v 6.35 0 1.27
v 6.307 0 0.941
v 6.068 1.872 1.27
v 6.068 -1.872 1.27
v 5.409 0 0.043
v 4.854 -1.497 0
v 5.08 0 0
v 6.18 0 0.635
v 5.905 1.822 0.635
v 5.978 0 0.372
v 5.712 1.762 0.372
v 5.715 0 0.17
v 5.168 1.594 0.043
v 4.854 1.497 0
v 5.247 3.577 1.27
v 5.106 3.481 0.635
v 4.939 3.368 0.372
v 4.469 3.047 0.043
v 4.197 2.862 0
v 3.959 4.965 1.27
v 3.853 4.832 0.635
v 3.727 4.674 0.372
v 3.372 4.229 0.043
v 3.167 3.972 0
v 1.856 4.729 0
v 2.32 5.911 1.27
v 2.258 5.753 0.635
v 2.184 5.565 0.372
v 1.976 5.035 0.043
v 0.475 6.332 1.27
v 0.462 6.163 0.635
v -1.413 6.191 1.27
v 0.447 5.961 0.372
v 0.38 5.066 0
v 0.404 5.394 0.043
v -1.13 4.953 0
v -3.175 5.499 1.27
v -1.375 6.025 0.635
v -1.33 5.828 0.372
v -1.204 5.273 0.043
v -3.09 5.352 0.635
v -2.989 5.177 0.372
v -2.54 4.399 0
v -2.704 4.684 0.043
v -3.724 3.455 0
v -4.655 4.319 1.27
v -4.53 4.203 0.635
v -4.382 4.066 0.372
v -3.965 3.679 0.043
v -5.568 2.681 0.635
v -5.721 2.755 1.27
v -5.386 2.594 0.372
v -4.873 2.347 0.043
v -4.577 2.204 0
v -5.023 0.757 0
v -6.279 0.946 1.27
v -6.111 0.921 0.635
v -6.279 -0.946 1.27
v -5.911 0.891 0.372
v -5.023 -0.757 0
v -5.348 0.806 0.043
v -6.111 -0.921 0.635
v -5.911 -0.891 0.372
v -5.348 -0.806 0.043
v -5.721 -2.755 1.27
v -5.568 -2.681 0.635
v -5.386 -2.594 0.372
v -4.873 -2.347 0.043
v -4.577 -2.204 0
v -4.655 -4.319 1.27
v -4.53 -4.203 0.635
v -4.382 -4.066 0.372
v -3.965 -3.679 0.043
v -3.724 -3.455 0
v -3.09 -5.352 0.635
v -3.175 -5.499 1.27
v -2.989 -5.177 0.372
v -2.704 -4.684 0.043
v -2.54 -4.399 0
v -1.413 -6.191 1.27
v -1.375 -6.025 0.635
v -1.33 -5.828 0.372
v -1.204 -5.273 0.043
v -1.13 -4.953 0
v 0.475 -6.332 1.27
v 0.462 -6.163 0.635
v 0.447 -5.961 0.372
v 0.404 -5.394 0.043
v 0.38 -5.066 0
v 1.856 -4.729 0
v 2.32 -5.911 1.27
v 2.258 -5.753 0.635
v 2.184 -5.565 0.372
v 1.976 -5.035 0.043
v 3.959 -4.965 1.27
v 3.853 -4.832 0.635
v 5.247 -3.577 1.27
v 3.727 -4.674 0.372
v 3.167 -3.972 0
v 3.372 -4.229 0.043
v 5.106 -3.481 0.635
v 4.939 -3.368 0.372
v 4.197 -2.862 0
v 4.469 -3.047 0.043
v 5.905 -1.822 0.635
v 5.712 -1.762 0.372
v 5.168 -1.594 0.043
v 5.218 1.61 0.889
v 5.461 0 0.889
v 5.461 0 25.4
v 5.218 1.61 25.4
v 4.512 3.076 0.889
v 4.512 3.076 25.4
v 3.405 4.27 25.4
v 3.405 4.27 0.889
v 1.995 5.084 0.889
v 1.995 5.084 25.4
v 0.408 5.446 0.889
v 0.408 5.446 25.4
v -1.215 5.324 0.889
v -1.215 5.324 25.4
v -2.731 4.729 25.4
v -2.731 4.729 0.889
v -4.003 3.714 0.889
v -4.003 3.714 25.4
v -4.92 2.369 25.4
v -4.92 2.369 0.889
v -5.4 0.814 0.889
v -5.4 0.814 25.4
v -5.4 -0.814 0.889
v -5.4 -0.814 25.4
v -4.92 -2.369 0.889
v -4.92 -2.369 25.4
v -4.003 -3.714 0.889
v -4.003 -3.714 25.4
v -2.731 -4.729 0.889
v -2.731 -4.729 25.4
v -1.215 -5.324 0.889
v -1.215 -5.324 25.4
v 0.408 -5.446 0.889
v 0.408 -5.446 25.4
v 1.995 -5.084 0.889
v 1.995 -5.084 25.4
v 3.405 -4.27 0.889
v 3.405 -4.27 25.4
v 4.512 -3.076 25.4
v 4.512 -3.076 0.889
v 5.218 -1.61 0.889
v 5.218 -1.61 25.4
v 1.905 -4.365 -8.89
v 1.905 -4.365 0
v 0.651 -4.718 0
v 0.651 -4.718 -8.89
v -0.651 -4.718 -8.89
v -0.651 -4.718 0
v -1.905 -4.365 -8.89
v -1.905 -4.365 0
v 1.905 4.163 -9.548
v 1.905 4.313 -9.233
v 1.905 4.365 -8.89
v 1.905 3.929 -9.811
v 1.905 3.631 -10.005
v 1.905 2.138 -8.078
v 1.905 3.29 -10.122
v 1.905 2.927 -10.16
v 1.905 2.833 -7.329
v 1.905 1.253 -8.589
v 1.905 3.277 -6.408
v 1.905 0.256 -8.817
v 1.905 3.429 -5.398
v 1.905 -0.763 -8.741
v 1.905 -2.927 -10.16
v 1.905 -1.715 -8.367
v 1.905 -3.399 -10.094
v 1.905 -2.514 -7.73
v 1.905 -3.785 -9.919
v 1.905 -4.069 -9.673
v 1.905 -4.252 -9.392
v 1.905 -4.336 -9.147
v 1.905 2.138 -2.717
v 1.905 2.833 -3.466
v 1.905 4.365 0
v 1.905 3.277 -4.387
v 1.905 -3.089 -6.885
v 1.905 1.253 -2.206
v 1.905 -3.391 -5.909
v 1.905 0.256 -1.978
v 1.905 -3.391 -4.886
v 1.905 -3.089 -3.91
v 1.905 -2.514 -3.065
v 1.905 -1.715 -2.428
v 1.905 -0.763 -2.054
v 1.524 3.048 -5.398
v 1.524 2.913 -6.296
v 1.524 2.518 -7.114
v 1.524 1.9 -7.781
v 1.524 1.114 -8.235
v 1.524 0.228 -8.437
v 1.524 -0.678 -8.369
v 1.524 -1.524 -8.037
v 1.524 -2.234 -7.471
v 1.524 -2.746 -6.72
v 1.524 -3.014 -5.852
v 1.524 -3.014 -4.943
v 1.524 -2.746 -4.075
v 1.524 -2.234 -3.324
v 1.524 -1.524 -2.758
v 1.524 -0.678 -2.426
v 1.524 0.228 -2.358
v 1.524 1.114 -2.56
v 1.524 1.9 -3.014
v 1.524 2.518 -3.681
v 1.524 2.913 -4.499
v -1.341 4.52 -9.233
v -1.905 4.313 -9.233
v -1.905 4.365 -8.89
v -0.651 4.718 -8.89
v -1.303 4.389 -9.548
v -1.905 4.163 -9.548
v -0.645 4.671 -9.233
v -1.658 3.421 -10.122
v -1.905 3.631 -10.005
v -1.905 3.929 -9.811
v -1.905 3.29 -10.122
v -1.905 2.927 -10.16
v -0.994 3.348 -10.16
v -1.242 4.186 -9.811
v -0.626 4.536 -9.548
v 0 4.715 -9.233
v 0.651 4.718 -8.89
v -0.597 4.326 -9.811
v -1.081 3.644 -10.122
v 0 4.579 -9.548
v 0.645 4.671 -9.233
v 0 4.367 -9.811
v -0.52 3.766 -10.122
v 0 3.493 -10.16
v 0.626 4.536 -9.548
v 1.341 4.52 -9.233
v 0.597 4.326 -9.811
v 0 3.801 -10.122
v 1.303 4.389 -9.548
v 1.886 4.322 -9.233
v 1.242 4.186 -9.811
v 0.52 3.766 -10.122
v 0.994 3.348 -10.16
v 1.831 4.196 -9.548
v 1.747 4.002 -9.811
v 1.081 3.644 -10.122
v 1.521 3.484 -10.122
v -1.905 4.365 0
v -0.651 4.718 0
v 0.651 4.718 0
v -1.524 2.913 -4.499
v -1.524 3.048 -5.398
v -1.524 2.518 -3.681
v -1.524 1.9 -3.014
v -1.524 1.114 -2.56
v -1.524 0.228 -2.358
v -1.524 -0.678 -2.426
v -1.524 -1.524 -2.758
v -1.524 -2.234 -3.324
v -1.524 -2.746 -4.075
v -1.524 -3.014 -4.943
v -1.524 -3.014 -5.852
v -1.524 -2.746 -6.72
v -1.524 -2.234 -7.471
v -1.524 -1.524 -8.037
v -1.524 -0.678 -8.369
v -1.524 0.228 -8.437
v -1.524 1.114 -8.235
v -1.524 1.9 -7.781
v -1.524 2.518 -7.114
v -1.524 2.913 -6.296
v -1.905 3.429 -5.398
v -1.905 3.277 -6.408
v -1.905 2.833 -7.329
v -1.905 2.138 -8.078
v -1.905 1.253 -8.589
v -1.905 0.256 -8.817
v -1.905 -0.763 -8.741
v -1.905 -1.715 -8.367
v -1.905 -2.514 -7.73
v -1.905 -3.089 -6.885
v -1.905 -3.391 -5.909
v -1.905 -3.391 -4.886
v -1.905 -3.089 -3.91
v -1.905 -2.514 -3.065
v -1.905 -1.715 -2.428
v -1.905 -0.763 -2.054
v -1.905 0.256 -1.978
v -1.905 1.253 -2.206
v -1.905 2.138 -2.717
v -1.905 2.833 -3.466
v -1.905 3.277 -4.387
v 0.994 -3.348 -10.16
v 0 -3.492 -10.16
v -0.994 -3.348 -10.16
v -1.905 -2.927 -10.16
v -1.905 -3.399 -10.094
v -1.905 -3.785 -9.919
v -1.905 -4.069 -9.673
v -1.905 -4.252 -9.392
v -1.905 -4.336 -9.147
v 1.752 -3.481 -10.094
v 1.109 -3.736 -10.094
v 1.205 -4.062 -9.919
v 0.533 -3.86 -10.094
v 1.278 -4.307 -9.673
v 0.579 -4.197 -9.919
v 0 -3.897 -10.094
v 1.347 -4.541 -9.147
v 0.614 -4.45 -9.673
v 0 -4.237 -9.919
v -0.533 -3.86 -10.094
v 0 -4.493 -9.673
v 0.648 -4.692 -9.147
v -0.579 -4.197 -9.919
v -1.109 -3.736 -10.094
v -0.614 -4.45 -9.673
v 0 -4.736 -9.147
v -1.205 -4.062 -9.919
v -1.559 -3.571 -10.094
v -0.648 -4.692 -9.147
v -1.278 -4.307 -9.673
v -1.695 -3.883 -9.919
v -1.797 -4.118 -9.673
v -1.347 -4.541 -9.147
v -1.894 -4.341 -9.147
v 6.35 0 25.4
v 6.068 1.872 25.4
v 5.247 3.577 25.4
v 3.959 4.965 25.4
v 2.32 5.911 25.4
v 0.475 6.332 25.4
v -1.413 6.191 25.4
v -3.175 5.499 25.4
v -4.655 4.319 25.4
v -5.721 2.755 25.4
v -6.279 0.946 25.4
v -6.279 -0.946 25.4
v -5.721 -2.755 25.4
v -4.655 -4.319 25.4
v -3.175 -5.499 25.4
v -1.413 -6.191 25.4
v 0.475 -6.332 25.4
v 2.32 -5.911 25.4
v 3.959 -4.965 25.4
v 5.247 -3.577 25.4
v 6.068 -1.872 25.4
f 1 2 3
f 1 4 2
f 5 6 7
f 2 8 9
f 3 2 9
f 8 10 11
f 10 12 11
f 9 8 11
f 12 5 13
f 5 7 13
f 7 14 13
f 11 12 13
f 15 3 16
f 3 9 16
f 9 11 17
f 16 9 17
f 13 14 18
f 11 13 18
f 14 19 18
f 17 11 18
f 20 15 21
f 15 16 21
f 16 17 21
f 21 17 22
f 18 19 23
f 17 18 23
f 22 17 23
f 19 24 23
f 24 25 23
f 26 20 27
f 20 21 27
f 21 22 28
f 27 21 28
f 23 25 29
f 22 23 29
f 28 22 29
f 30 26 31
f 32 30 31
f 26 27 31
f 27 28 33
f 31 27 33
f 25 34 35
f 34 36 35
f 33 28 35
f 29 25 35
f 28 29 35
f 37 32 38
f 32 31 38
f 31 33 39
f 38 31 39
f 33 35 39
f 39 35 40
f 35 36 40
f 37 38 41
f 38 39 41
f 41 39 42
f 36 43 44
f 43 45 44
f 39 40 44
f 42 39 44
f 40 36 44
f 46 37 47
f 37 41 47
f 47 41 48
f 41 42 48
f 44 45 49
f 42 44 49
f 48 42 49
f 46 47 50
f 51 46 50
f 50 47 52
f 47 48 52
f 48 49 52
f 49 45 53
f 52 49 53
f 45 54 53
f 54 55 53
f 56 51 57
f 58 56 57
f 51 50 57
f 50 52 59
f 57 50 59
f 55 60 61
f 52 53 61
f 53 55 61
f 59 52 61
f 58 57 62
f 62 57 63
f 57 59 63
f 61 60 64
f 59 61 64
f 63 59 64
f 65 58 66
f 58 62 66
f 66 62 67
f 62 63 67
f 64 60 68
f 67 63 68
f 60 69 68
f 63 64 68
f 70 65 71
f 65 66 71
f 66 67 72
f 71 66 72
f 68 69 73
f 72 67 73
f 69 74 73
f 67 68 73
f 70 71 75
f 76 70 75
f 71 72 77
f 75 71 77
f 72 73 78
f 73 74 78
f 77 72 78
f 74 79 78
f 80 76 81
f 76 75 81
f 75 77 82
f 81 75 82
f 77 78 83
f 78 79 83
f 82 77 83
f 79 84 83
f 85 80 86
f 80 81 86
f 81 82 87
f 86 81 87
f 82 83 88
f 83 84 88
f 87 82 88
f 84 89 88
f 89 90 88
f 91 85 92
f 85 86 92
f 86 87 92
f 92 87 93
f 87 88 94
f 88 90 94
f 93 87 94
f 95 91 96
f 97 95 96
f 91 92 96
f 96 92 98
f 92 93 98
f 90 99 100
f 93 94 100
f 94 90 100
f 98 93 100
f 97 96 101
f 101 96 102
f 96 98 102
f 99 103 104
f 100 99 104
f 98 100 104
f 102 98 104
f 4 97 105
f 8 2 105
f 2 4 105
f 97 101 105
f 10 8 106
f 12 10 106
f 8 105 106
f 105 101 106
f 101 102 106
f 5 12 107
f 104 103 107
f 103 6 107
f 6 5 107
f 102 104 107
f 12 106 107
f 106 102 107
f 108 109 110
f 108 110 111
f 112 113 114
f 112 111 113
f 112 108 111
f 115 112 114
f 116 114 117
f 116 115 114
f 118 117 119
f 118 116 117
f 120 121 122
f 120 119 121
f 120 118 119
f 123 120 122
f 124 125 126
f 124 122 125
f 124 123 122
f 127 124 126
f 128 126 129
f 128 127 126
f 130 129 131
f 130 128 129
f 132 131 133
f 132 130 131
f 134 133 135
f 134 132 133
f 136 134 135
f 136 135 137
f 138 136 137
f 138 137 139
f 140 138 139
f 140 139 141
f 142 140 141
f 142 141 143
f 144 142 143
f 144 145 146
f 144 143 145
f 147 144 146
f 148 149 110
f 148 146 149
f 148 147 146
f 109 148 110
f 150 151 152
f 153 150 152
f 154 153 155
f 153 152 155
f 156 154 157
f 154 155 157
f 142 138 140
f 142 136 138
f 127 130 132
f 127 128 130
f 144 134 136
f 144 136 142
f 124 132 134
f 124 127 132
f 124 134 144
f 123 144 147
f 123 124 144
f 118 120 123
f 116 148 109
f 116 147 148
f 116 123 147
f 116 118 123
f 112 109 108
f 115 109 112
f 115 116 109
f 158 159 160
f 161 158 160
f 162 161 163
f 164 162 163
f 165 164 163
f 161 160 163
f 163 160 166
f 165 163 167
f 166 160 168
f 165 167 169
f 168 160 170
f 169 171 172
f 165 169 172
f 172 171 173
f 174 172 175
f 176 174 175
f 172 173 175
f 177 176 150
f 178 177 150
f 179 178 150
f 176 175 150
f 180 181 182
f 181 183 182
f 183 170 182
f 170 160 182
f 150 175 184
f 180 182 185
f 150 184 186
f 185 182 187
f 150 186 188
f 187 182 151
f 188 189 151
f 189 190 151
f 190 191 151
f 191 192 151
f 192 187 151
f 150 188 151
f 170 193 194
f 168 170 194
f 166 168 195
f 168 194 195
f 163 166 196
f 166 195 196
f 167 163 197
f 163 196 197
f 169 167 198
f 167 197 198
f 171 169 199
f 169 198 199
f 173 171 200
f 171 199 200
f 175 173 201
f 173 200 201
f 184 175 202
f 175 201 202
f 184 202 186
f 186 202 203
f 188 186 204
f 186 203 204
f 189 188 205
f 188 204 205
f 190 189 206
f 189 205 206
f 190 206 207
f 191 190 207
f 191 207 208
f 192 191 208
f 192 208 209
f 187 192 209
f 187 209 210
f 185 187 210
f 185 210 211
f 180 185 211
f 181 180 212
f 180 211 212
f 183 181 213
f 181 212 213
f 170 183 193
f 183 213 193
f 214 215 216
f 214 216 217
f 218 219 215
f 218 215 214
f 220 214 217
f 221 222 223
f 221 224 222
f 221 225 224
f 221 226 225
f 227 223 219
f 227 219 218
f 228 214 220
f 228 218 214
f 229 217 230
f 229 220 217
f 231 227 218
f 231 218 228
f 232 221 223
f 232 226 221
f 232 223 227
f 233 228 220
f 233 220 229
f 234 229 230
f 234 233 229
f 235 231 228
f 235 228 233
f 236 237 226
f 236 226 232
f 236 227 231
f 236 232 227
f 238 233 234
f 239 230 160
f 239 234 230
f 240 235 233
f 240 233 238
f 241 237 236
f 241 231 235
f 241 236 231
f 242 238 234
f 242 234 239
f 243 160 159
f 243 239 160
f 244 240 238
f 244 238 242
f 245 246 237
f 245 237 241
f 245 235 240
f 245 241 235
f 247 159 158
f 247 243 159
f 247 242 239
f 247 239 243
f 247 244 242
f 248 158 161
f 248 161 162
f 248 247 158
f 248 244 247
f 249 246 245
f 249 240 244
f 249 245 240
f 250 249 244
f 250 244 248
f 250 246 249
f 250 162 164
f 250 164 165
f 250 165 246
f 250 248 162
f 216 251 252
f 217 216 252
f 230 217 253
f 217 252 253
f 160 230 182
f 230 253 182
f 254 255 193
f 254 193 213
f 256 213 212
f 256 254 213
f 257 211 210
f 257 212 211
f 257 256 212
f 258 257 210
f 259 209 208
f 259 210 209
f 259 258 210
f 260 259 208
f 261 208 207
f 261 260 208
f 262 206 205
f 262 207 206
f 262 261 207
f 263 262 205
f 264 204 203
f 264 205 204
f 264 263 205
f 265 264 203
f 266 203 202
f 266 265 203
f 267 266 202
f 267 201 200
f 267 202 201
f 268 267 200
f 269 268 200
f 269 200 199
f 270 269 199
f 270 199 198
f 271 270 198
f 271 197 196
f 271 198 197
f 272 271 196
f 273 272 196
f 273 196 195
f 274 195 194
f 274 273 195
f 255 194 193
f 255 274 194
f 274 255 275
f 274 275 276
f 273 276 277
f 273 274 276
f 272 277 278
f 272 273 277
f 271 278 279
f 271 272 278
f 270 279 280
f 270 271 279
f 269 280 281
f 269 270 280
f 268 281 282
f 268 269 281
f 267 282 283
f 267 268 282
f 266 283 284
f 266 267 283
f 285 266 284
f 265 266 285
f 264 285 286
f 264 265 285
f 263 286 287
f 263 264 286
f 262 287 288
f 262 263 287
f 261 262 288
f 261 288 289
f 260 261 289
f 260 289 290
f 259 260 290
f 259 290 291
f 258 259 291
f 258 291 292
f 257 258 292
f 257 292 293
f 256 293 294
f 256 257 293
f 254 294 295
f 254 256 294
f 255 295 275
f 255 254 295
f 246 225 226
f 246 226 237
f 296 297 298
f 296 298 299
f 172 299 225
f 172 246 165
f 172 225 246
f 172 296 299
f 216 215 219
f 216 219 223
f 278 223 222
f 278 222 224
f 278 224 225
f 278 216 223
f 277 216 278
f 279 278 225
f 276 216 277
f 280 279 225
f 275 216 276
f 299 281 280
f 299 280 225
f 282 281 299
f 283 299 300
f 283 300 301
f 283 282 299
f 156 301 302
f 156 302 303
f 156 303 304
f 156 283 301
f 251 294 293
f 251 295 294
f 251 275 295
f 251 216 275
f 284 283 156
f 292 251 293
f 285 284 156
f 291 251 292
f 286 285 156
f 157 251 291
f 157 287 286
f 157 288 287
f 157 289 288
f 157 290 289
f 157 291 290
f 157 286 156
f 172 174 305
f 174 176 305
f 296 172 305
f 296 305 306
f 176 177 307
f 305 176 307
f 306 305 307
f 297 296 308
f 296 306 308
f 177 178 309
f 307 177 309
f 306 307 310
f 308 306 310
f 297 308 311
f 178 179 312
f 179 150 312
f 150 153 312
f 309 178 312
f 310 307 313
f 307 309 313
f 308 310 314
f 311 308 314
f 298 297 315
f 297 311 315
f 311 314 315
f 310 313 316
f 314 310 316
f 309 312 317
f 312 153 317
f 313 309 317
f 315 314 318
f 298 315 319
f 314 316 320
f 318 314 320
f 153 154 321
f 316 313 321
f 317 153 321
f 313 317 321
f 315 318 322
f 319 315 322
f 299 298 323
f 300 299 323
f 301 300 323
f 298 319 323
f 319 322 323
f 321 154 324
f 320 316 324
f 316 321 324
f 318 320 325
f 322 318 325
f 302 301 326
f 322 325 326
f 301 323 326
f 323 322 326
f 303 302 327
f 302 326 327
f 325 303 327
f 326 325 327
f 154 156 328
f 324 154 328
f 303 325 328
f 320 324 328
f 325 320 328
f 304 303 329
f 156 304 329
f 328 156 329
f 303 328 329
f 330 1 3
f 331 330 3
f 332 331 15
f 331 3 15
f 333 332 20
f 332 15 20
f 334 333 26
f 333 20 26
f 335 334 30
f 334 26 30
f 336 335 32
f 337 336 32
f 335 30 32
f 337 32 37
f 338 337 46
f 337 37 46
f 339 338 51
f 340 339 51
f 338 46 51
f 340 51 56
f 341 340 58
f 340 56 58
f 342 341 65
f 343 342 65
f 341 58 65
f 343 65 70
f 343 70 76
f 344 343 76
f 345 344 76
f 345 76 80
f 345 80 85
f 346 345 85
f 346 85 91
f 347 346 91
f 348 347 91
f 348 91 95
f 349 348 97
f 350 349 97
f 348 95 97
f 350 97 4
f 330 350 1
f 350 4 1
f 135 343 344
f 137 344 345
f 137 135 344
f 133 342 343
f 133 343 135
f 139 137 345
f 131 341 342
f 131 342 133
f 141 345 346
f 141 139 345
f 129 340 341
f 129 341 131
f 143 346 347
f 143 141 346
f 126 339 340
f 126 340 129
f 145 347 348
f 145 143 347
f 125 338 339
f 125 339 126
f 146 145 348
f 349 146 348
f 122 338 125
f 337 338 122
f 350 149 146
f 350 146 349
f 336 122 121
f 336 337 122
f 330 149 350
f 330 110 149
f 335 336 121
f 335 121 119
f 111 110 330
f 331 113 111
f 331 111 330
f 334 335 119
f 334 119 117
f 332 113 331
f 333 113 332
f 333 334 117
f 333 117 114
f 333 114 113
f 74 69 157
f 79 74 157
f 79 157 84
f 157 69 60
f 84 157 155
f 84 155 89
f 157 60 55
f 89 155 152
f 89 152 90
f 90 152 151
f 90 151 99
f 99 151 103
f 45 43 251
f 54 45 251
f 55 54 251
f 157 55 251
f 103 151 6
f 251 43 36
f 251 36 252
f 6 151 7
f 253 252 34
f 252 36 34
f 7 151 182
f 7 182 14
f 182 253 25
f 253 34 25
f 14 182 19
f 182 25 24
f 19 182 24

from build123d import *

# Parameters (mm, degrees)
SKETCH1_R               = 6.35
BOSS_EXTRUDE1_DEPTH     = 25.4
SHELL1_T                = -0.889
FILLET1_R               = 1.27
SKETCH2_R               = 4.7625
BOSS_EXTRUDE2_DEPTH     = 10.16
CUT_EXTRUDE1_START      = -10.16
CUT_EXTRUDE1_DEPTH      = 10.16
CUT_EXTRUDE2_DEPTH      = 28.452277251
CUT_EXTRUDE2_DEPTH_BACK = 28.452277251
SKETCH4_R               = 3.048
CHAMFER2_SIZE           = 0.381
FILLET2_R               = 1.27


with BuildPart() as part:
    # Sketch1 → Boss-Extrude1 (new body)
    with BuildSketch(Plane.XY):
        Circle(SKETCH1_R)
    extrude(amount=BOSS_EXTRUDE1_DEPTH)

    # Shell1
    shell1_openings = [part.faces().sort_by_distance(p)[0] for p in [
        (0, 0, 25.4),
    ]]
    offset(amount=SHELL1_T, openings=shell1_openings, kind=Kind.INTERSECTION)

    # Fillet1
    fillet1_edges = [part.edges().sort_by_distance(p)[0] for p in [
        (-6.35, 0, 0),
    ]]
    fillet(fillet1_edges, radius=FILLET1_R)

    # Sketch2 → Boss-Extrude2 (add)
    with BuildSketch(Plane(origin=(0, 0, 0), x_dir=(-1, 0, 0), z_dir=(0, 0, -1))):
        with Locations(Location((0, 0, 0), (0, 0, 180))):
            Circle(SKETCH2_R)
    extrude(amount=BOSS_EXTRUDE2_DEPTH)

    # Sketch3 → Cut-Extrude1 (cut)
    with BuildSketch(Plane(origin=(0, 0, -10.16), x_dir=(-1, 0, 0), z_dir=(0, 0, -1)).offset(CUT_EXTRUDE1_START)):
        with BuildLine():
            Line((-1.905, 4.364903349), (-1.905, -4.364903349))
            ThreePointArc((-1.905, -4.364903349), (-4.7625, 0), (-1.905, 4.364903349))
        make_face()
        with BuildLine():
            Line((1.905, 4.364903349), (1.905, -4.364903349))
            ThreePointArc((1.905, -4.364903349), (4.7625, 0), (1.905, 4.364903349))
        make_face()
    extrude(amount=CUT_EXTRUDE1_DEPTH, mode=Mode.SUBTRACT)

    # Sketch4 → Cut-Extrude2 (cut, two sides: drawn at the far end of the back side and taken through both)
    with BuildSketch(Plane(origin=(1.905, 0, 0), x_dir=(0, 0, -1), z_dir=(1, 0, 0)).offset(-CUT_EXTRUDE2_DEPTH_BACK)):
        with Locations(Location((5.3975, 0, 0), (0, 0, 90))):
            Circle(SKETCH4_R)
    extrude(amount=CUT_EXTRUDE2_DEPTH + CUT_EXTRUDE2_DEPTH_BACK, mode=Mode.SUBTRACT)

    # Chamfer2
    chamfer2_edges = [part.edges().sort_by_distance(p)[0] for p in [
        (1.905, -3.048, -5.3975),
        (-1.905, -3.048, -5.3975),
    ]]
    chamfer(chamfer2_edges, length=CHAMFER2_SIZE)

    # Fillet2
    fillet2_edges = [part.edges().sort_by_distance(p)[0] for p in [
        (0, 4.7625, -10.16),
        (0, -4.7625, -10.16),
    ]]
    fillet(fillet2_edges, radius=FILLET2_R)


solid = part.part
